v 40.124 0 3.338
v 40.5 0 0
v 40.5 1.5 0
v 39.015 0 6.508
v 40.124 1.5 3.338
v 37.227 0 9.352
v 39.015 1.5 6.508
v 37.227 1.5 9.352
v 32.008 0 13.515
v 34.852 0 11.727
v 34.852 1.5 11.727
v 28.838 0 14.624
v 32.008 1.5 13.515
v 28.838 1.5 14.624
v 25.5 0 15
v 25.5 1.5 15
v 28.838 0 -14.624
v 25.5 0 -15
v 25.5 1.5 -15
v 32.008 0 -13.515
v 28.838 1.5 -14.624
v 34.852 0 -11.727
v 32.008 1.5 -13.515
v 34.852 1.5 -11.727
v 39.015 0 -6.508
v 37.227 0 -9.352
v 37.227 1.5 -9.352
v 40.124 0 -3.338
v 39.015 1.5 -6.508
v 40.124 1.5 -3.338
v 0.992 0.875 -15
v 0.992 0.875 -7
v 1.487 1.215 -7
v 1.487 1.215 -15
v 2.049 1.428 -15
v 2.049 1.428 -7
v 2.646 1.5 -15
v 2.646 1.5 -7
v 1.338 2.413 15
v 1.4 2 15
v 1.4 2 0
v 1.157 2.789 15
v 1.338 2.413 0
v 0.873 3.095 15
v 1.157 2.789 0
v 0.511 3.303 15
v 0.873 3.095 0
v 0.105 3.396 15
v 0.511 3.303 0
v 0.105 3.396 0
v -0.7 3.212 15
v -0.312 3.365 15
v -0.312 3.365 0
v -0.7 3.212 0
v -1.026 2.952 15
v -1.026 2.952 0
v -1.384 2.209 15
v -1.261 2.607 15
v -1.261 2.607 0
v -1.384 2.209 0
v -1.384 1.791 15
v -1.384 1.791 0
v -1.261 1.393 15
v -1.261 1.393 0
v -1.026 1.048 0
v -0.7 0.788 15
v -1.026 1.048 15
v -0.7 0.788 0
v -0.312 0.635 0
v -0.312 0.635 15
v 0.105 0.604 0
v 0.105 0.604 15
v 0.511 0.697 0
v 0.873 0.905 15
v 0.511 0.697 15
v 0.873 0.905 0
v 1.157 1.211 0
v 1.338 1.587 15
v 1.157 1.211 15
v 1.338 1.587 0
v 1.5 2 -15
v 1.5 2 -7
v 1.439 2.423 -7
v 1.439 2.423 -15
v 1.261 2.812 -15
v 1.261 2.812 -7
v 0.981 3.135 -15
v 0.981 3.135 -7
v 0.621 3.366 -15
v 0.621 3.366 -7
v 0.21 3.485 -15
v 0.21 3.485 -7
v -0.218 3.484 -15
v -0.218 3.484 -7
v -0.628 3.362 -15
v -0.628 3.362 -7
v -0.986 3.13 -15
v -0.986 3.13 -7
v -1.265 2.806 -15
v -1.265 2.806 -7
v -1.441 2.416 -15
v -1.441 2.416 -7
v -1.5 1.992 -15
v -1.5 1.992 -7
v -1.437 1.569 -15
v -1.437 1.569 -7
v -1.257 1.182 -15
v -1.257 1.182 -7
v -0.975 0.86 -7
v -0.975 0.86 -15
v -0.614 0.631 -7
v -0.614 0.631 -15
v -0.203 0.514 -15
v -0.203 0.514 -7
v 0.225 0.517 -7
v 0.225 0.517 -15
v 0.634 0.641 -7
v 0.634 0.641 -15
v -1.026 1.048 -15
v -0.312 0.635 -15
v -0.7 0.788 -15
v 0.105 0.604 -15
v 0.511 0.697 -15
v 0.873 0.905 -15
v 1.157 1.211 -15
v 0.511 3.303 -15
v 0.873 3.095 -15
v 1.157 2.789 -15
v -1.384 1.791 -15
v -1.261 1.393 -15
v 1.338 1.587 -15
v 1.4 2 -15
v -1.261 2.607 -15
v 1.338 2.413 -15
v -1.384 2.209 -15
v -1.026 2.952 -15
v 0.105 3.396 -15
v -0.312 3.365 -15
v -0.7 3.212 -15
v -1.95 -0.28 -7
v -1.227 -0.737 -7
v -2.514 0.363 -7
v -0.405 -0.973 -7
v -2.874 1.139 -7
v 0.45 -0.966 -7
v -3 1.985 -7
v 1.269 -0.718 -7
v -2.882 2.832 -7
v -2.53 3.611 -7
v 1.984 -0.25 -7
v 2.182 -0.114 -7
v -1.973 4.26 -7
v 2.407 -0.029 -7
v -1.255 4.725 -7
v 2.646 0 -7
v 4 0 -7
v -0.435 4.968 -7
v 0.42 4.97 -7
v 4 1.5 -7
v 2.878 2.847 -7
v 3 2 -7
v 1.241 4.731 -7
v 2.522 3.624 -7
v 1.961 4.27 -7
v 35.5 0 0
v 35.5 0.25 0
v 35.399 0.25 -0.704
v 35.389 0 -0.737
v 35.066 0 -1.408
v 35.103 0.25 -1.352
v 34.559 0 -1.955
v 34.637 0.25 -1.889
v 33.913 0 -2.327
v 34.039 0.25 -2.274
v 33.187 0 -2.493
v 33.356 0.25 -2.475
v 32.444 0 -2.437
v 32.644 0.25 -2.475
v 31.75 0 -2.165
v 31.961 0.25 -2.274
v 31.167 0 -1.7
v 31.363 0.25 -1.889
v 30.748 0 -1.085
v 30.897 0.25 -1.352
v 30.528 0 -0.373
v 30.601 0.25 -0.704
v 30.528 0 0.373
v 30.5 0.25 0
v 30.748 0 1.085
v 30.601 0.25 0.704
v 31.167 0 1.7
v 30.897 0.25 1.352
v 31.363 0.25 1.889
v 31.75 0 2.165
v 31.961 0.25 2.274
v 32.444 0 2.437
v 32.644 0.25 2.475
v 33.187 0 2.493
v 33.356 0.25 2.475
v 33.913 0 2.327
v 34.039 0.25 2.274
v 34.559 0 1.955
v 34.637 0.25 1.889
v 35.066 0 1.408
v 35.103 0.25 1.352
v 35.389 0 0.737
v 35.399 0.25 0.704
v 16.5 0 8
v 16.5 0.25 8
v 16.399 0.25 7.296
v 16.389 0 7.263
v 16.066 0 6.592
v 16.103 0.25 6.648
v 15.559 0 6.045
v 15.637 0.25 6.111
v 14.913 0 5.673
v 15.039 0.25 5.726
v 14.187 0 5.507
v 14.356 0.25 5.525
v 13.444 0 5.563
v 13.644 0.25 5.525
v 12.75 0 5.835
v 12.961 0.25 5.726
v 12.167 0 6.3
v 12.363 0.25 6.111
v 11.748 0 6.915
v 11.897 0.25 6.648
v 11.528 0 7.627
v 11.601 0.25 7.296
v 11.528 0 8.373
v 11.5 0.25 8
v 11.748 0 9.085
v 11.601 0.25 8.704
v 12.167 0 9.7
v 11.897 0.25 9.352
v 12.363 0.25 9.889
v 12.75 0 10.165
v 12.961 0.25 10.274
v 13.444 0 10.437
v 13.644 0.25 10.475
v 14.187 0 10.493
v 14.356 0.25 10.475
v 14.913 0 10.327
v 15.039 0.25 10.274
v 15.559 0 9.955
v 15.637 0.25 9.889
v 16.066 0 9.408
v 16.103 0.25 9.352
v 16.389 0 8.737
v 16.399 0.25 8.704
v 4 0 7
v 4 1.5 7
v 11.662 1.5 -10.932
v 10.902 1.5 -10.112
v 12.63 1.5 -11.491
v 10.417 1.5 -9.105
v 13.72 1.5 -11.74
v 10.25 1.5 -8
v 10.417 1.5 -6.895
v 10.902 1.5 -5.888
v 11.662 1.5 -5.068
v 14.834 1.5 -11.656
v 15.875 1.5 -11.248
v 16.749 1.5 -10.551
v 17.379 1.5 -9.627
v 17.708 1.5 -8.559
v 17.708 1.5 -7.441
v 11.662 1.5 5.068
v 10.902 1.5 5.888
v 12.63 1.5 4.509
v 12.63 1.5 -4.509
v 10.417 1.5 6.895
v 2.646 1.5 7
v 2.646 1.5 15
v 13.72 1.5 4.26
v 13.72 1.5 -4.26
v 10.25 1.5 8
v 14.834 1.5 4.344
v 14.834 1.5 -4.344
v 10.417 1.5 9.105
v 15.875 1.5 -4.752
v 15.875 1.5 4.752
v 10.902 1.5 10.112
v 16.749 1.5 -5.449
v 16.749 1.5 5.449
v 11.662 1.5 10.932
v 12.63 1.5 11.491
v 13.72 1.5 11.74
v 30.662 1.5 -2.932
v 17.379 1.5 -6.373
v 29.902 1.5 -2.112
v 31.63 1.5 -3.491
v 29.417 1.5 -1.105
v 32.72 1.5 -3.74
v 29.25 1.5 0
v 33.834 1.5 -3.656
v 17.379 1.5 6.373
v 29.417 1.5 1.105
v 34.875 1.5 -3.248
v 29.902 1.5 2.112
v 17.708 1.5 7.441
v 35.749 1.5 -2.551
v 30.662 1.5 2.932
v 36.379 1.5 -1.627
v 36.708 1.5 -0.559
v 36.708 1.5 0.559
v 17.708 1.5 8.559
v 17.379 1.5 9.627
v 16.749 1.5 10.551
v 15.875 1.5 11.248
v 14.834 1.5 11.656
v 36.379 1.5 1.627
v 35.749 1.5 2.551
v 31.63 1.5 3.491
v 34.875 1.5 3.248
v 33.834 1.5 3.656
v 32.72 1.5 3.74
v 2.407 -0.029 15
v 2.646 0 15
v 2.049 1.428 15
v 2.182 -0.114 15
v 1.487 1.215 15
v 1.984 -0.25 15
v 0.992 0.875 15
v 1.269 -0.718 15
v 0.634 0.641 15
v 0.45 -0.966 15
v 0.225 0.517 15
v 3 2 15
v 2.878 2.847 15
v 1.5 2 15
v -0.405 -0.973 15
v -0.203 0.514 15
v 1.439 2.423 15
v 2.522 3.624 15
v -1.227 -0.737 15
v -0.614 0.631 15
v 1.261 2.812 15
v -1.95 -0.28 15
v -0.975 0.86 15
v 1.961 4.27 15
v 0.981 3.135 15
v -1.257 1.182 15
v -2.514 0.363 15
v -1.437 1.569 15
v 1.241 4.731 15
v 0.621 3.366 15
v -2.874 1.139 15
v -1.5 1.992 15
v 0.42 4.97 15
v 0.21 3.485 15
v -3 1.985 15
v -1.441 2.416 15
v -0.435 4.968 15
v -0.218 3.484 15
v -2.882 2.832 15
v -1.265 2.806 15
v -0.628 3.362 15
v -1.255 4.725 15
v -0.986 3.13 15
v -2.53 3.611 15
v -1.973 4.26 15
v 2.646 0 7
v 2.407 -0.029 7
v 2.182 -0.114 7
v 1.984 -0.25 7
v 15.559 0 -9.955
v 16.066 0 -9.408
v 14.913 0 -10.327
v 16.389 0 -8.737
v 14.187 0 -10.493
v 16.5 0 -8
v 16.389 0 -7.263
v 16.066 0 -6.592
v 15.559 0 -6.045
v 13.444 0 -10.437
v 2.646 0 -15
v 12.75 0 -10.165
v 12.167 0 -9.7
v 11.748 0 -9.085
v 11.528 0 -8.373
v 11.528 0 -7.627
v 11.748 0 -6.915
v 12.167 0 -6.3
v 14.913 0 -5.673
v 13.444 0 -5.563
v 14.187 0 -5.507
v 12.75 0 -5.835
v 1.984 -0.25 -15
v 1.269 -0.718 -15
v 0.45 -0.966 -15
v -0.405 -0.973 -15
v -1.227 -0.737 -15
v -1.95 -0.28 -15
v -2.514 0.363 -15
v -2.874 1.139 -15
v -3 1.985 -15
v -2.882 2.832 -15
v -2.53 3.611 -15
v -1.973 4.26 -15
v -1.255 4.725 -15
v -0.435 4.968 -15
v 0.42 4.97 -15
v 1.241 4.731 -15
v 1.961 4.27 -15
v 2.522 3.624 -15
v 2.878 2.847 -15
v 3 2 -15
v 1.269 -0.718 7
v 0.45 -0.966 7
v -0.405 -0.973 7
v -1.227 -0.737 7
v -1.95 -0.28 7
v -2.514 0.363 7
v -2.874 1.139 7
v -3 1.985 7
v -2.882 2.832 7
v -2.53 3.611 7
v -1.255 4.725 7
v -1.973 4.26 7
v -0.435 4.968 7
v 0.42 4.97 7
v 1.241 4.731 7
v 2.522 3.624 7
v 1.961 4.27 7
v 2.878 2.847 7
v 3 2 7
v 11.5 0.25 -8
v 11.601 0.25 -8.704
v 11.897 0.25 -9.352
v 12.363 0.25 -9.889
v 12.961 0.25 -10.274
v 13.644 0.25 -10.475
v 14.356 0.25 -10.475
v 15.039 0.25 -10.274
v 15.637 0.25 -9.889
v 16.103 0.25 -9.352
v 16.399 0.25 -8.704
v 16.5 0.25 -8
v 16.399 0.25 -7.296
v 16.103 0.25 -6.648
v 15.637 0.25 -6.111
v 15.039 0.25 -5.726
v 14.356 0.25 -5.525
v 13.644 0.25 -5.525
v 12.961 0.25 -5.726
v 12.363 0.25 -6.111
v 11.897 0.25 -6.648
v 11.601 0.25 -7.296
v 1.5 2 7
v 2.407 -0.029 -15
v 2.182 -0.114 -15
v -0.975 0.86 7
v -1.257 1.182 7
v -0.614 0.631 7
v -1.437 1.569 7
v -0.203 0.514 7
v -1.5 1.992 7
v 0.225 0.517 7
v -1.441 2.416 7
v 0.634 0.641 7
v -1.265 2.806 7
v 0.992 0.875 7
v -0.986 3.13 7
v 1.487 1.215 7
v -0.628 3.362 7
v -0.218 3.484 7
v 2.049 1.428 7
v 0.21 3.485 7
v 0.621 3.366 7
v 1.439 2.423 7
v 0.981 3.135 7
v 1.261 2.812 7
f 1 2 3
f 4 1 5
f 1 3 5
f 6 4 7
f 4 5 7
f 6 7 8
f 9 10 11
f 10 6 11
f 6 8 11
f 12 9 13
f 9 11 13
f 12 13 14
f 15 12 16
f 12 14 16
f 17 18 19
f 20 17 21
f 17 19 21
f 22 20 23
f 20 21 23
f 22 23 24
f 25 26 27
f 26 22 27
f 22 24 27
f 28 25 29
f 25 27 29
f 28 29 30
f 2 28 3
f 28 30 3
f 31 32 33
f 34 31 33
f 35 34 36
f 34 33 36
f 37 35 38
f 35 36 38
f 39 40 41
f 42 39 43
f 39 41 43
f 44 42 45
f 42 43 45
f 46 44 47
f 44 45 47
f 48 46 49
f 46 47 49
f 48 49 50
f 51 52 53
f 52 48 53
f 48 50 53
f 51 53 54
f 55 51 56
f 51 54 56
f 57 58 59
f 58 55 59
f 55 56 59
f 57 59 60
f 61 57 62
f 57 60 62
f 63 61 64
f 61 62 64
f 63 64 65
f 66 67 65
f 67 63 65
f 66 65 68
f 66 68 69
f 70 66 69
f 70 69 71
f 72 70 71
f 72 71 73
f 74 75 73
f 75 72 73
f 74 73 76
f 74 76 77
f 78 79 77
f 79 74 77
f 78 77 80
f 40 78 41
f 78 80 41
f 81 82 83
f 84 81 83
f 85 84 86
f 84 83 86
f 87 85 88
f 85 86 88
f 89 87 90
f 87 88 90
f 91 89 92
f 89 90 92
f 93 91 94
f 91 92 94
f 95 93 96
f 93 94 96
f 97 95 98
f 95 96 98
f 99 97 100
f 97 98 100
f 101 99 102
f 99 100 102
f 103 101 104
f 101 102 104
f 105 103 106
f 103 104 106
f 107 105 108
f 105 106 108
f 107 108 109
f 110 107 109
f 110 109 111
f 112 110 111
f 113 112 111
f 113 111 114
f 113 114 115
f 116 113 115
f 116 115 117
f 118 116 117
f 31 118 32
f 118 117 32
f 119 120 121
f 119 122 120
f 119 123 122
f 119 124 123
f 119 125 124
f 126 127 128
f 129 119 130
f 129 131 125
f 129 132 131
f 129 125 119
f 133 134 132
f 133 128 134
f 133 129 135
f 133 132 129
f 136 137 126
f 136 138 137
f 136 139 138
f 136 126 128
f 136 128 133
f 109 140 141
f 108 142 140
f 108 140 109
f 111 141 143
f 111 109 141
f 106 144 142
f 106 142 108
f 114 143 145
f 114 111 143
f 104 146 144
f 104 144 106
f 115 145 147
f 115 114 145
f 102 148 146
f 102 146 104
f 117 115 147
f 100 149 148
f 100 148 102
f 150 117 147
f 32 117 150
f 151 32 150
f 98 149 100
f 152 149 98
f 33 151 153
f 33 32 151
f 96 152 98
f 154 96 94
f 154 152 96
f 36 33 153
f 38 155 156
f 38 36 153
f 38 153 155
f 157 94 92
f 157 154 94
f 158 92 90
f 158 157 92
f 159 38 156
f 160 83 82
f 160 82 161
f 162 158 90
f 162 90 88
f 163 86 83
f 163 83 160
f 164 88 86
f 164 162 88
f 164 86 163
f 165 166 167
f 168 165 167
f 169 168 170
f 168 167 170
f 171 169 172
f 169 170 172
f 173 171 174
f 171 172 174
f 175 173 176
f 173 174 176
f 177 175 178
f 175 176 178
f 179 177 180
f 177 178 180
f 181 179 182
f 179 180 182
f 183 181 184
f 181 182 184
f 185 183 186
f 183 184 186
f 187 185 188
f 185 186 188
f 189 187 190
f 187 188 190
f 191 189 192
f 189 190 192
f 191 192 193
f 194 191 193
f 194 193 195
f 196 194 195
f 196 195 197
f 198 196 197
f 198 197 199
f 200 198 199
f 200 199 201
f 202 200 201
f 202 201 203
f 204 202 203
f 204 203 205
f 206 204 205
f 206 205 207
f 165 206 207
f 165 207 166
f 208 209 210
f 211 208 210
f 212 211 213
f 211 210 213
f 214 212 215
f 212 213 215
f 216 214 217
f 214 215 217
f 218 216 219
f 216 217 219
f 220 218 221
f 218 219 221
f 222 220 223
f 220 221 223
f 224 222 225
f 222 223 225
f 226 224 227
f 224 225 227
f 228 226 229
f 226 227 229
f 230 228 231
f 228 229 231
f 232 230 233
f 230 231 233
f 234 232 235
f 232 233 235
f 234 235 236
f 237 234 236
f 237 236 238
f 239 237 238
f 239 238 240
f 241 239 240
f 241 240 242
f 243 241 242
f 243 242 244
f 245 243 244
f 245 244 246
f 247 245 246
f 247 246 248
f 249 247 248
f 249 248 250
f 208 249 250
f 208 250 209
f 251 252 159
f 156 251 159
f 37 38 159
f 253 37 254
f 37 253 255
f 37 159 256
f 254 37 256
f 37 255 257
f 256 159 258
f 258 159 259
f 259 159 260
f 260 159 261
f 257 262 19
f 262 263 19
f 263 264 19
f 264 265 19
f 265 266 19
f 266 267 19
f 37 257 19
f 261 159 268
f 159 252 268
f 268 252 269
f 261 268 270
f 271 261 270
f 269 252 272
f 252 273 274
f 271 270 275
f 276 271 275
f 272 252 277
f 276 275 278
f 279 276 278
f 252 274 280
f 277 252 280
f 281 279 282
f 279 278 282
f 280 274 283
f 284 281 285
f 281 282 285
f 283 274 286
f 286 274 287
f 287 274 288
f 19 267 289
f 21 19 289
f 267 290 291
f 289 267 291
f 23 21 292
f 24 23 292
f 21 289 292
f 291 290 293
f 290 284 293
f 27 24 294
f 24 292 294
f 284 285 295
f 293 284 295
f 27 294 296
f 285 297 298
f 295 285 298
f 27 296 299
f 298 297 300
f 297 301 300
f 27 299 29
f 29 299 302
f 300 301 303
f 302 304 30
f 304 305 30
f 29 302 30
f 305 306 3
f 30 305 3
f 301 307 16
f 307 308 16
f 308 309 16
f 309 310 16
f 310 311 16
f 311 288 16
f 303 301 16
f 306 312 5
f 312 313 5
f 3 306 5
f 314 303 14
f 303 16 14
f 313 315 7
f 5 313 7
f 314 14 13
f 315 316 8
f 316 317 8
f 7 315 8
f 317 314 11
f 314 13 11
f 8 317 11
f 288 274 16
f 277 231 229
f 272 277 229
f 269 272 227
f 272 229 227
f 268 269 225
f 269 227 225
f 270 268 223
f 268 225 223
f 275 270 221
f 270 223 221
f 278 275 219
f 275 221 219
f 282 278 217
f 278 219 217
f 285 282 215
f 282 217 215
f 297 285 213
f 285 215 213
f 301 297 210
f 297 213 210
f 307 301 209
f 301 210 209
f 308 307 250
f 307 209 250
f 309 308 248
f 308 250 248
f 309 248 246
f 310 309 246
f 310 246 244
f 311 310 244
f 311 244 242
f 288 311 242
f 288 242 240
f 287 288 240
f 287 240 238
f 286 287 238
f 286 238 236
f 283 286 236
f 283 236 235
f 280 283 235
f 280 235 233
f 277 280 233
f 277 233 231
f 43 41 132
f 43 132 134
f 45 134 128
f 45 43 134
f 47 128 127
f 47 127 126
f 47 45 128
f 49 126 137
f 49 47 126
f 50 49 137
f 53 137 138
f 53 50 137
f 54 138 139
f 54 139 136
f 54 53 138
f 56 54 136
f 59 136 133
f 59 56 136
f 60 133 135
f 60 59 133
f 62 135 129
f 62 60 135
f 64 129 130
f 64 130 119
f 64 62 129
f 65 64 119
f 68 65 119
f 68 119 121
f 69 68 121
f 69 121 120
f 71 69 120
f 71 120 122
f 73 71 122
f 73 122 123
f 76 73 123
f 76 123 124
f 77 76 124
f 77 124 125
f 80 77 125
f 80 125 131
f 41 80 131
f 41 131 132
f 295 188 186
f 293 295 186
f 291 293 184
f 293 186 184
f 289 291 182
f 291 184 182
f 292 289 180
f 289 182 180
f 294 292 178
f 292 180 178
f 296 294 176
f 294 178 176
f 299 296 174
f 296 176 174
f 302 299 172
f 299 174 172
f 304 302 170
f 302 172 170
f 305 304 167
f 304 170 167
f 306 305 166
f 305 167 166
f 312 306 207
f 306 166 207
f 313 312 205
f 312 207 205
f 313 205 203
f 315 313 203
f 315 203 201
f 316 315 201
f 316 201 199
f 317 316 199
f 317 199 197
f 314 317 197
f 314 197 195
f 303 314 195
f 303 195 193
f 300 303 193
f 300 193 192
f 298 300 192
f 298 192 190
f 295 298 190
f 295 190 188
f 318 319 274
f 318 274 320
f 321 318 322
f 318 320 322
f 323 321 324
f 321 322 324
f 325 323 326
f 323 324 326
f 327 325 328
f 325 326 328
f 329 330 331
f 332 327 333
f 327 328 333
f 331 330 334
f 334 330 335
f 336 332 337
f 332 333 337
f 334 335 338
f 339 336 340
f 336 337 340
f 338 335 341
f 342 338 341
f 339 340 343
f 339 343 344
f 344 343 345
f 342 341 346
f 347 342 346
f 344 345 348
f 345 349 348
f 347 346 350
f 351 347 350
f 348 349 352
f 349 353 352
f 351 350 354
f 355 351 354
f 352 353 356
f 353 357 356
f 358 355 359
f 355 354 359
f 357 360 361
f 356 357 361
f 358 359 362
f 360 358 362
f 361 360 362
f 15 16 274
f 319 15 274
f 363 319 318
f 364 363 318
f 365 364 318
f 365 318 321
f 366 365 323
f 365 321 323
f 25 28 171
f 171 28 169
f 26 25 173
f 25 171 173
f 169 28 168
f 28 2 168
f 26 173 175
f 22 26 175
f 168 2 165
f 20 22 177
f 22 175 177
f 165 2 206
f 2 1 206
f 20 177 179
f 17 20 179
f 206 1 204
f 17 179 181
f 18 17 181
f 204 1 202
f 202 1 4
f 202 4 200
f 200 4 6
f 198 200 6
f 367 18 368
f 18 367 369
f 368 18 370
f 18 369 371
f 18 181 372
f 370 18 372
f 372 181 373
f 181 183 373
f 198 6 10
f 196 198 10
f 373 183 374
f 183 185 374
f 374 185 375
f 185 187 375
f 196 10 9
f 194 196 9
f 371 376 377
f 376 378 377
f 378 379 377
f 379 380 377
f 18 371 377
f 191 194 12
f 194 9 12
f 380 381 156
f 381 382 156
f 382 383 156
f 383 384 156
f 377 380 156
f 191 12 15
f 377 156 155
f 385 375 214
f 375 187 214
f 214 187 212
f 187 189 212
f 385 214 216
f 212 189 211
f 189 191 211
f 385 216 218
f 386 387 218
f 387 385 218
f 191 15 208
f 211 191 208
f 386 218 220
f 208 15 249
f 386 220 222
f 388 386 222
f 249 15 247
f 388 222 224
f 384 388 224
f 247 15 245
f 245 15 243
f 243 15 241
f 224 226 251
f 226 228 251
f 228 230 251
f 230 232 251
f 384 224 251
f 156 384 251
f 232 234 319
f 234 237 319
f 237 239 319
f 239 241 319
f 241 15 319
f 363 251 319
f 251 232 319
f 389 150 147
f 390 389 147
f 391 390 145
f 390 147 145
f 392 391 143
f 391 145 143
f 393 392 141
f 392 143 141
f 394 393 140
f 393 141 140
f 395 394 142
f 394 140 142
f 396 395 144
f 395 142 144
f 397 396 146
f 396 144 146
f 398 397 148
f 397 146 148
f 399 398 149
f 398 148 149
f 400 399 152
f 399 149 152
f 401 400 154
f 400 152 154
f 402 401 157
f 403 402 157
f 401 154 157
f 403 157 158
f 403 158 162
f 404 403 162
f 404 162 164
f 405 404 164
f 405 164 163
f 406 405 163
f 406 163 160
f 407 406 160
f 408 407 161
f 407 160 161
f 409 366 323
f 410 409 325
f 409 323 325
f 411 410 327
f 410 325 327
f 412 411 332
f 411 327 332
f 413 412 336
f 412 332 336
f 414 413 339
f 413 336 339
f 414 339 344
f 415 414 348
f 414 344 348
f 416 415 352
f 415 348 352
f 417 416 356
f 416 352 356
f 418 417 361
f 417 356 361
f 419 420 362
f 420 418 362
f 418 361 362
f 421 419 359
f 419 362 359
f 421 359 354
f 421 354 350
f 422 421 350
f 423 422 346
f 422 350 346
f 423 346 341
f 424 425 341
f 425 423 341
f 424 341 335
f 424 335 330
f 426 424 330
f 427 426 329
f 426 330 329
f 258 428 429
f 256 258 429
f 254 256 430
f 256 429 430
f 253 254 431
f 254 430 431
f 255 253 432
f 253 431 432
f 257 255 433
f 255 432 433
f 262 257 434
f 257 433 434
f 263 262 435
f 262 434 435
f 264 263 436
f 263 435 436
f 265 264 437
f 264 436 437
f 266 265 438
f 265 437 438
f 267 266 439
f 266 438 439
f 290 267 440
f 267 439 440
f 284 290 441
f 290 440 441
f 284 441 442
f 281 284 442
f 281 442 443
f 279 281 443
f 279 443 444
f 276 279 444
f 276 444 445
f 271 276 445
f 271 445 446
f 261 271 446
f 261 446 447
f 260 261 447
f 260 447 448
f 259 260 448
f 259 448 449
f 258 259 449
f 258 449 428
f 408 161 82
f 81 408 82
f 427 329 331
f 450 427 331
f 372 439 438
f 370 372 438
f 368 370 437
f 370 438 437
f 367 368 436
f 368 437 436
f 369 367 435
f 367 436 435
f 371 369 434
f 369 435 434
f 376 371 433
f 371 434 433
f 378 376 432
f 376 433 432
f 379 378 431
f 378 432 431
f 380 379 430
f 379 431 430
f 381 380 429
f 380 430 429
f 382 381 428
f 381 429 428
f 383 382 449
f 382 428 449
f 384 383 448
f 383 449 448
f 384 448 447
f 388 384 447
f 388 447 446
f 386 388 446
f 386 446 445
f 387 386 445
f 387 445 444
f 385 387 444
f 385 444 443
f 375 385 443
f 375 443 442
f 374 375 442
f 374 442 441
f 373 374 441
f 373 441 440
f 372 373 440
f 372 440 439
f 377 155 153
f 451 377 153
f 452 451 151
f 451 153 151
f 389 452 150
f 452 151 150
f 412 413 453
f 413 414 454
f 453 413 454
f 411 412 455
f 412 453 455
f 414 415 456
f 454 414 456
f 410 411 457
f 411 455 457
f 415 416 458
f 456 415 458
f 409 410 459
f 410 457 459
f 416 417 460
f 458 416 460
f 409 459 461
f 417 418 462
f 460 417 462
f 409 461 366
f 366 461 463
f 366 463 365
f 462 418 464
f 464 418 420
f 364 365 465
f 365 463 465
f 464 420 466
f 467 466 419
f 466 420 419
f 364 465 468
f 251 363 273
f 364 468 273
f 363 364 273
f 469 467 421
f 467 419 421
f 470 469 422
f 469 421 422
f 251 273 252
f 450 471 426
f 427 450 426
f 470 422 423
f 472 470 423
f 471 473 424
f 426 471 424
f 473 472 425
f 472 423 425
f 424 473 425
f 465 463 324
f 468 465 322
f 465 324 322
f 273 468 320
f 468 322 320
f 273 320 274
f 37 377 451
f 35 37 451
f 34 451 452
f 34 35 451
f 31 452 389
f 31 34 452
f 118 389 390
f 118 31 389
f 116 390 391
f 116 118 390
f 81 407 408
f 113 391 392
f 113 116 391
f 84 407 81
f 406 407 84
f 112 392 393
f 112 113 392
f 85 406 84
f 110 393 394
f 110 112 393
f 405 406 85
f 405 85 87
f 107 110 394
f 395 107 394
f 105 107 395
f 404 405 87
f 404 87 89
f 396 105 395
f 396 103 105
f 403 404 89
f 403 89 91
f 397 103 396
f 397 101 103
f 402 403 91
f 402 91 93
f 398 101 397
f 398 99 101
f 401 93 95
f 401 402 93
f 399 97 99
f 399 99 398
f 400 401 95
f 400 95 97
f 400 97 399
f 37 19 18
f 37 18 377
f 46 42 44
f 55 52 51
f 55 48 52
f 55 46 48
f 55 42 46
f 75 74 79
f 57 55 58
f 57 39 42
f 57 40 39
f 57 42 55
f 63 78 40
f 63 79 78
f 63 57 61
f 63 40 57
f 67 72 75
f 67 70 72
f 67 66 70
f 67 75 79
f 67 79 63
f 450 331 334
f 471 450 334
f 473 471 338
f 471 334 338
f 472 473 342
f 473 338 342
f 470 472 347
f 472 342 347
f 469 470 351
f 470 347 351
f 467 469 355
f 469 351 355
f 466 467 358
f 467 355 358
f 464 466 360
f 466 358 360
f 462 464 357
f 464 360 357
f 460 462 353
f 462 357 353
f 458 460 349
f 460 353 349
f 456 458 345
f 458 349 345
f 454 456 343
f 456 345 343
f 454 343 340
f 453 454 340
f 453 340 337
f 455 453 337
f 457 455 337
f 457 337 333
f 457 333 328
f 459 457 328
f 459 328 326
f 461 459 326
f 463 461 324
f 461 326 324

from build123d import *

# Parameters (mm, degrees)
BODY_DEPTH                    = 15
SKETCH_2_R                    = 2.5
CUT_1_DEPTH                   = 30
HOLE_WIZARD_7_5_5_D           = 5
HOLE_WIZARD_7_5_5_DEPTH       = 8.5
HOLE_WIZARD_7_5_5_CSINK_D     = 7.5
HOLE_WIZARD_7_5_5_CSINK_ANGLE = 90
HOLE_WIZARD_7_5_5_TIP         = 1.502151548
SKETCH_4_W                    = 8
SKETCH_4_H                    = 14
CUT_EXTRUDE_2_DEPTH           = 15
EXTRUDE_1_REACH               = 17
SKETCH_6_R                    = 1.4
EXTRUDE_1_DIRECTION_2_REACH   = 17


with BuildPart() as part:
    # ｽｹｯﾁ1 → BODY (new body, symmetric)
    with BuildSketch(Plane.XY):
        with BuildLine():
            Line((2.645751311, 1.5), (40.5, 1.5))
            Line((40.5, 1.5), (40.5, 0))
            Line((40.5, 0), (2.645751311, 0))
            ThreePointArc((2.645751311, 0), (2.29219792, -0.064585653), (1.984313483, -0.25))
            ThreePointArc((1.984313483, -0.25), (-2.734313483, 3.234313483), (3, 2))
            Line((3, 2), (1.5, 2))
            ThreePointArc((1.5, 2), (-1.367156742, 2.617156742), (0.992156742, 0.875))
            ThreePointArc((0.992156742, 0.875), (1.761867835, 1.338535867), (2.645751311, 1.5))
        make_face()
    extrude(amount=BODY_DEPTH, both=True)

    # ｽｹｯﾁ2 → CUT-1 (cut)
    with BuildSketch(Plane(origin=(0, 1.5, 0), x_dir=(1, 0, 0), z_dir=(0, 1, 0))):
        with Locations((33, 0)):
            Circle(SKETCH_2_R)
        with Locations((14, 8)):
            Circle(SKETCH_2_R)
        with Locations((14, -8)):
            Circle(SKETCH_2_R)
        with BuildLine():
            Line((40.5, -15), (40.5, 0))
            ThreePointArc((40.5, 0), (36.106601718, -10.606601718), (25.5, -15))
            Line((25.5, -15), (40.5, -15))
        make_face()
        with BuildLine():
            Line((40.5, 15), (25.5, 15))
            ThreePointArc((25.5, 15), (36.106601718, 10.606601718), (40.5, 0))
            Line((40.5, 0), (40.5, 15))
        make_face()
    extrude(amount=-CUT_1_DEPTH, mode=Mode.SUBTRACT)

    # φ7.5-φ5
    with Locations(Plane(origin=(14, 1.5, -8), x_dir=(1, 0, 0), z_dir=(0, 1, 0))):
        with Locations((0, 0), (0, -16), (19, -8)):
            CounterSinkHole(HOLE_WIZARD_7_5_5_D / 2, HOLE_WIZARD_7_5_5_CSINK_D / 2, depth=HOLE_WIZARD_7_5_5_DEPTH, counter_sink_angle=HOLE_WIZARD_7_5_5_CSINK_ANGLE)
            with Locations((0, 0, -(HOLE_WIZARD_7_5_5_DEPTH + HOLE_WIZARD_7_5_5_TIP / 2))):  # 118° drill point
                Cone(0, HOLE_WIZARD_7_5_5_D / 2, HOLE_WIZARD_7_5_5_TIP, mode=Mode.SUBTRACT)

    # ｽｹｯﾁ4 → ｶｯﾄ - 押し出し2 (cut, symmetric)
    with BuildSketch(Plane(origin=(0, 1.5, 0), x_dir=(1, 0, 0), z_dir=(0, 1, 0))):
        Rectangle(SKETCH_4_W, SKETCH_4_H)
    extrude(amount=CUT_EXTRUDE_2_DEPTH, both=True, mode=Mode.SUBTRACT)


with BuildPart() as body_2:

    # ﾎﾞｽ - 押し出し1: up to this face of the body (flat: up to its plane)
    extrude_1_end = Plane(part.part.faces().sort_by_distance((8.809859415, 1.217701285, 15))[0])
    # ｽｹｯﾁ6 → ﾎﾞｽ - 押し出し1 (new body, up to the picked face)
    with BuildSketch(Plane.XY, mode=Mode.PRIVATE) as extrude_1_sk1:
        with Locations((0, 2)):
            Circle(SKETCH_6_R)
    extrude_1_tool1 = split(extrude(extrude_1_sk1.sketch, amount=EXTRUDE_1_REACH, mode=Mode.PRIVATE), bisect_by=extrude_1_end, keep=Keep.BOTH, mode=Mode.PRIVATE)
    add(extrude_1_tool1.solids().sort_by_distance((0, 2, 0))[0])


    # ﾎﾞｽ - 押し出し1 direction 2: up to this face of the body (flat: up to its plane)
    extrude_1_direction_2_end = Plane(part.part.faces().sort_by_distance((8.809859415, 1.217701285, -15))[0])
    # ｽｹｯﾁ6 → ﾎﾞｽ - 押し出し1 direction 2 (add, up to the picked face)
    with BuildSketch(Plane.XY, mode=Mode.PRIVATE) as extrude_1_direction_2_sk1:
        with Locations((0, 2)):
            Circle(SKETCH_6_R)
    extrude_1_direction_2_tool1 = split(extrude(extrude_1_direction_2_sk1.sketch, amount=-EXTRUDE_1_DIRECTION_2_REACH, mode=Mode.PRIVATE), bisect_by=extrude_1_direction_2_end, keep=Keep.BOTH, mode=Mode.PRIVATE)
    add(extrude_1_direction_2_tool1.solids().sort_by_distance((0, 2, 0))[0])


solid = Compound([part.part, body_2.part])
